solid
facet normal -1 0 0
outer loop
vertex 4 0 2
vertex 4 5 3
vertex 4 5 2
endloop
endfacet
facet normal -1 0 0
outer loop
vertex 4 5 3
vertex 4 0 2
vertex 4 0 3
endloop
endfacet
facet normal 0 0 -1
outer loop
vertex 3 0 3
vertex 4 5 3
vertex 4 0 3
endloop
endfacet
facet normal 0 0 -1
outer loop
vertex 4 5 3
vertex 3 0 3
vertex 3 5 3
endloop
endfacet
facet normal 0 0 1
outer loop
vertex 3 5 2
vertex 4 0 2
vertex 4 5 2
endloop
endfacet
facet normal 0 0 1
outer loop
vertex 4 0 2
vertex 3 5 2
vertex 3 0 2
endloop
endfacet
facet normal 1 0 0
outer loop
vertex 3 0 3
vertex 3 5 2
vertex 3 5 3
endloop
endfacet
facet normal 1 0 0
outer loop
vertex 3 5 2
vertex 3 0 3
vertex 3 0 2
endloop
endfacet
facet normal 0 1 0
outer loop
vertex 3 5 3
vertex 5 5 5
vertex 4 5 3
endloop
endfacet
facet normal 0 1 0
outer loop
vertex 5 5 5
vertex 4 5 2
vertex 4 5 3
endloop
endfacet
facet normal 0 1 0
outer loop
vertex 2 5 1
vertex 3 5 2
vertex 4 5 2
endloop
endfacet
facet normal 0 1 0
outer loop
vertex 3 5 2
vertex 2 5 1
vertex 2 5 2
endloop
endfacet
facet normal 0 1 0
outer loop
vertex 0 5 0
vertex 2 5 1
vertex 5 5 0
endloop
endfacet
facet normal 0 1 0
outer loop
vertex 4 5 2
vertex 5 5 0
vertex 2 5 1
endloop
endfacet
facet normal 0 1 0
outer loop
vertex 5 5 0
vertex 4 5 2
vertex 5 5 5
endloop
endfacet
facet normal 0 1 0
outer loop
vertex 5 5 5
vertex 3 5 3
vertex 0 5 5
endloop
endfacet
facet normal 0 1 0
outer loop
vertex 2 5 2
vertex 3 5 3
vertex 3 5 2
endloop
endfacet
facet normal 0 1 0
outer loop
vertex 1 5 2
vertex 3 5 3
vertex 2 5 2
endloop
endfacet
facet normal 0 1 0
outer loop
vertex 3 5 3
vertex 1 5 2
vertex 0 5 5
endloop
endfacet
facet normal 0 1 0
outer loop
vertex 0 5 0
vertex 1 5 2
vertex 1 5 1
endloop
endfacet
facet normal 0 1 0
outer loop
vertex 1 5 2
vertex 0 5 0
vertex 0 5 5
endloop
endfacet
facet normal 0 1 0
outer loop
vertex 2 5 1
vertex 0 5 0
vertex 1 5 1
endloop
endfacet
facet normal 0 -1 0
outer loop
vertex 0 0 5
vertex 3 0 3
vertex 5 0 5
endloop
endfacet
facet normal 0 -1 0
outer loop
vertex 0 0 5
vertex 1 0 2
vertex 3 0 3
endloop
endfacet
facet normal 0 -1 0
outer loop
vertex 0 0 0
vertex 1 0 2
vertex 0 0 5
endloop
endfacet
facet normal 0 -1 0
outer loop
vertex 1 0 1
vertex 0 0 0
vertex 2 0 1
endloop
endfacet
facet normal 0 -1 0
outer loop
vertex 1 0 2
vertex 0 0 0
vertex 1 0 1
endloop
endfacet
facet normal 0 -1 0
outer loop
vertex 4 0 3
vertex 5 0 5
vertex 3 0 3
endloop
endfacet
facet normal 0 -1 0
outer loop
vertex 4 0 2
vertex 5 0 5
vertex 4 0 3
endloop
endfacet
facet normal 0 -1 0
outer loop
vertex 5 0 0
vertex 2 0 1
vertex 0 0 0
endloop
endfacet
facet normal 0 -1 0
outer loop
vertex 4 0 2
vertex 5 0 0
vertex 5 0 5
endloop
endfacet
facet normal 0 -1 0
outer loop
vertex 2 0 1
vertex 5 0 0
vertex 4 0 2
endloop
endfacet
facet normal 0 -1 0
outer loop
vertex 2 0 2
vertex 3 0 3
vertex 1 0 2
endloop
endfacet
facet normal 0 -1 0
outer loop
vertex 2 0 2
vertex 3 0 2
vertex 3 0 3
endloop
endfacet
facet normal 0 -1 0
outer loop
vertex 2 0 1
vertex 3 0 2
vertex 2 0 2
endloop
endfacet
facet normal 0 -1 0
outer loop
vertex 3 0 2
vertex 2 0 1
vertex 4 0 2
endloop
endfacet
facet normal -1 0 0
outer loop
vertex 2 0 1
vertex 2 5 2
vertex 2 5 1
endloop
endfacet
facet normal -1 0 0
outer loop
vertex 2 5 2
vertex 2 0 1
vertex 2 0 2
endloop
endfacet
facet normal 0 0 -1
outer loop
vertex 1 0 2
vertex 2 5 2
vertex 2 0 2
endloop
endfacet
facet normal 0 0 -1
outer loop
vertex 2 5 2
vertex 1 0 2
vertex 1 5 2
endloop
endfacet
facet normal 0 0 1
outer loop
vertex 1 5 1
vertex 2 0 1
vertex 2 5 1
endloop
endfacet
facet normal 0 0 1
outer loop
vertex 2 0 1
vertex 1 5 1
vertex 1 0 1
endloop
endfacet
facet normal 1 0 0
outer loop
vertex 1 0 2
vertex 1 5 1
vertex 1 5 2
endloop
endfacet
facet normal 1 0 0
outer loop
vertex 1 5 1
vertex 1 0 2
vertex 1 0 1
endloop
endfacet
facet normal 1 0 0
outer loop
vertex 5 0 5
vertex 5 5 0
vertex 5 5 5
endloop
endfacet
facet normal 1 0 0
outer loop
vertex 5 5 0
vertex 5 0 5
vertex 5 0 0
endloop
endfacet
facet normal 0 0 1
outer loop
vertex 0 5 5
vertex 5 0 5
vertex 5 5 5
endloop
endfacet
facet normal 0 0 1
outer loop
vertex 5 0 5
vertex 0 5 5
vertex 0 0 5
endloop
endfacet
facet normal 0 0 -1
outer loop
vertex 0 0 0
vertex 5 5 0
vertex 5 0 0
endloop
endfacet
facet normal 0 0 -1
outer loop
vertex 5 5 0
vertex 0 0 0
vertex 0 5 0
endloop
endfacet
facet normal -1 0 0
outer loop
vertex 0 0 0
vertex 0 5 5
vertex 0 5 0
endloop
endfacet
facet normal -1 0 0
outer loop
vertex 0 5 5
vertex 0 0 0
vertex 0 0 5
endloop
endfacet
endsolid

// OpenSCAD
difference() {
  translate([2.5000000000, 2.5000000000, 2.5000000000]) {
    scale([5.0000000000, 5.0000000000, 5.0000000000]) {
      translate([-0.5000000000, -0.5000000000, -0.5000000000]) {
        cube([1, 1, 1]);
      }
    }
  }
  union() {
    translate([3.5000000000, 2.5000000000, 2.5000000000]) {
      scale([1.0000000000, 5.0000000000, 1.0000000000]) {
        translate([-0.5000000000, -0.5000000000, -0.5000000000]) {
          cube([1, 1, 1]);
        }
      }
    }
    translate([1.5000000000, 2.5000000000, 1.5000000000]) {
      scale([1.0000000000, 5.0000000000, 1.0000000000]) {
        translate([-0.5000000000, -0.5000000000, -0.5000000000]) {
          cube([1, 1, 1]);
        }
      }
    }
  }
}
